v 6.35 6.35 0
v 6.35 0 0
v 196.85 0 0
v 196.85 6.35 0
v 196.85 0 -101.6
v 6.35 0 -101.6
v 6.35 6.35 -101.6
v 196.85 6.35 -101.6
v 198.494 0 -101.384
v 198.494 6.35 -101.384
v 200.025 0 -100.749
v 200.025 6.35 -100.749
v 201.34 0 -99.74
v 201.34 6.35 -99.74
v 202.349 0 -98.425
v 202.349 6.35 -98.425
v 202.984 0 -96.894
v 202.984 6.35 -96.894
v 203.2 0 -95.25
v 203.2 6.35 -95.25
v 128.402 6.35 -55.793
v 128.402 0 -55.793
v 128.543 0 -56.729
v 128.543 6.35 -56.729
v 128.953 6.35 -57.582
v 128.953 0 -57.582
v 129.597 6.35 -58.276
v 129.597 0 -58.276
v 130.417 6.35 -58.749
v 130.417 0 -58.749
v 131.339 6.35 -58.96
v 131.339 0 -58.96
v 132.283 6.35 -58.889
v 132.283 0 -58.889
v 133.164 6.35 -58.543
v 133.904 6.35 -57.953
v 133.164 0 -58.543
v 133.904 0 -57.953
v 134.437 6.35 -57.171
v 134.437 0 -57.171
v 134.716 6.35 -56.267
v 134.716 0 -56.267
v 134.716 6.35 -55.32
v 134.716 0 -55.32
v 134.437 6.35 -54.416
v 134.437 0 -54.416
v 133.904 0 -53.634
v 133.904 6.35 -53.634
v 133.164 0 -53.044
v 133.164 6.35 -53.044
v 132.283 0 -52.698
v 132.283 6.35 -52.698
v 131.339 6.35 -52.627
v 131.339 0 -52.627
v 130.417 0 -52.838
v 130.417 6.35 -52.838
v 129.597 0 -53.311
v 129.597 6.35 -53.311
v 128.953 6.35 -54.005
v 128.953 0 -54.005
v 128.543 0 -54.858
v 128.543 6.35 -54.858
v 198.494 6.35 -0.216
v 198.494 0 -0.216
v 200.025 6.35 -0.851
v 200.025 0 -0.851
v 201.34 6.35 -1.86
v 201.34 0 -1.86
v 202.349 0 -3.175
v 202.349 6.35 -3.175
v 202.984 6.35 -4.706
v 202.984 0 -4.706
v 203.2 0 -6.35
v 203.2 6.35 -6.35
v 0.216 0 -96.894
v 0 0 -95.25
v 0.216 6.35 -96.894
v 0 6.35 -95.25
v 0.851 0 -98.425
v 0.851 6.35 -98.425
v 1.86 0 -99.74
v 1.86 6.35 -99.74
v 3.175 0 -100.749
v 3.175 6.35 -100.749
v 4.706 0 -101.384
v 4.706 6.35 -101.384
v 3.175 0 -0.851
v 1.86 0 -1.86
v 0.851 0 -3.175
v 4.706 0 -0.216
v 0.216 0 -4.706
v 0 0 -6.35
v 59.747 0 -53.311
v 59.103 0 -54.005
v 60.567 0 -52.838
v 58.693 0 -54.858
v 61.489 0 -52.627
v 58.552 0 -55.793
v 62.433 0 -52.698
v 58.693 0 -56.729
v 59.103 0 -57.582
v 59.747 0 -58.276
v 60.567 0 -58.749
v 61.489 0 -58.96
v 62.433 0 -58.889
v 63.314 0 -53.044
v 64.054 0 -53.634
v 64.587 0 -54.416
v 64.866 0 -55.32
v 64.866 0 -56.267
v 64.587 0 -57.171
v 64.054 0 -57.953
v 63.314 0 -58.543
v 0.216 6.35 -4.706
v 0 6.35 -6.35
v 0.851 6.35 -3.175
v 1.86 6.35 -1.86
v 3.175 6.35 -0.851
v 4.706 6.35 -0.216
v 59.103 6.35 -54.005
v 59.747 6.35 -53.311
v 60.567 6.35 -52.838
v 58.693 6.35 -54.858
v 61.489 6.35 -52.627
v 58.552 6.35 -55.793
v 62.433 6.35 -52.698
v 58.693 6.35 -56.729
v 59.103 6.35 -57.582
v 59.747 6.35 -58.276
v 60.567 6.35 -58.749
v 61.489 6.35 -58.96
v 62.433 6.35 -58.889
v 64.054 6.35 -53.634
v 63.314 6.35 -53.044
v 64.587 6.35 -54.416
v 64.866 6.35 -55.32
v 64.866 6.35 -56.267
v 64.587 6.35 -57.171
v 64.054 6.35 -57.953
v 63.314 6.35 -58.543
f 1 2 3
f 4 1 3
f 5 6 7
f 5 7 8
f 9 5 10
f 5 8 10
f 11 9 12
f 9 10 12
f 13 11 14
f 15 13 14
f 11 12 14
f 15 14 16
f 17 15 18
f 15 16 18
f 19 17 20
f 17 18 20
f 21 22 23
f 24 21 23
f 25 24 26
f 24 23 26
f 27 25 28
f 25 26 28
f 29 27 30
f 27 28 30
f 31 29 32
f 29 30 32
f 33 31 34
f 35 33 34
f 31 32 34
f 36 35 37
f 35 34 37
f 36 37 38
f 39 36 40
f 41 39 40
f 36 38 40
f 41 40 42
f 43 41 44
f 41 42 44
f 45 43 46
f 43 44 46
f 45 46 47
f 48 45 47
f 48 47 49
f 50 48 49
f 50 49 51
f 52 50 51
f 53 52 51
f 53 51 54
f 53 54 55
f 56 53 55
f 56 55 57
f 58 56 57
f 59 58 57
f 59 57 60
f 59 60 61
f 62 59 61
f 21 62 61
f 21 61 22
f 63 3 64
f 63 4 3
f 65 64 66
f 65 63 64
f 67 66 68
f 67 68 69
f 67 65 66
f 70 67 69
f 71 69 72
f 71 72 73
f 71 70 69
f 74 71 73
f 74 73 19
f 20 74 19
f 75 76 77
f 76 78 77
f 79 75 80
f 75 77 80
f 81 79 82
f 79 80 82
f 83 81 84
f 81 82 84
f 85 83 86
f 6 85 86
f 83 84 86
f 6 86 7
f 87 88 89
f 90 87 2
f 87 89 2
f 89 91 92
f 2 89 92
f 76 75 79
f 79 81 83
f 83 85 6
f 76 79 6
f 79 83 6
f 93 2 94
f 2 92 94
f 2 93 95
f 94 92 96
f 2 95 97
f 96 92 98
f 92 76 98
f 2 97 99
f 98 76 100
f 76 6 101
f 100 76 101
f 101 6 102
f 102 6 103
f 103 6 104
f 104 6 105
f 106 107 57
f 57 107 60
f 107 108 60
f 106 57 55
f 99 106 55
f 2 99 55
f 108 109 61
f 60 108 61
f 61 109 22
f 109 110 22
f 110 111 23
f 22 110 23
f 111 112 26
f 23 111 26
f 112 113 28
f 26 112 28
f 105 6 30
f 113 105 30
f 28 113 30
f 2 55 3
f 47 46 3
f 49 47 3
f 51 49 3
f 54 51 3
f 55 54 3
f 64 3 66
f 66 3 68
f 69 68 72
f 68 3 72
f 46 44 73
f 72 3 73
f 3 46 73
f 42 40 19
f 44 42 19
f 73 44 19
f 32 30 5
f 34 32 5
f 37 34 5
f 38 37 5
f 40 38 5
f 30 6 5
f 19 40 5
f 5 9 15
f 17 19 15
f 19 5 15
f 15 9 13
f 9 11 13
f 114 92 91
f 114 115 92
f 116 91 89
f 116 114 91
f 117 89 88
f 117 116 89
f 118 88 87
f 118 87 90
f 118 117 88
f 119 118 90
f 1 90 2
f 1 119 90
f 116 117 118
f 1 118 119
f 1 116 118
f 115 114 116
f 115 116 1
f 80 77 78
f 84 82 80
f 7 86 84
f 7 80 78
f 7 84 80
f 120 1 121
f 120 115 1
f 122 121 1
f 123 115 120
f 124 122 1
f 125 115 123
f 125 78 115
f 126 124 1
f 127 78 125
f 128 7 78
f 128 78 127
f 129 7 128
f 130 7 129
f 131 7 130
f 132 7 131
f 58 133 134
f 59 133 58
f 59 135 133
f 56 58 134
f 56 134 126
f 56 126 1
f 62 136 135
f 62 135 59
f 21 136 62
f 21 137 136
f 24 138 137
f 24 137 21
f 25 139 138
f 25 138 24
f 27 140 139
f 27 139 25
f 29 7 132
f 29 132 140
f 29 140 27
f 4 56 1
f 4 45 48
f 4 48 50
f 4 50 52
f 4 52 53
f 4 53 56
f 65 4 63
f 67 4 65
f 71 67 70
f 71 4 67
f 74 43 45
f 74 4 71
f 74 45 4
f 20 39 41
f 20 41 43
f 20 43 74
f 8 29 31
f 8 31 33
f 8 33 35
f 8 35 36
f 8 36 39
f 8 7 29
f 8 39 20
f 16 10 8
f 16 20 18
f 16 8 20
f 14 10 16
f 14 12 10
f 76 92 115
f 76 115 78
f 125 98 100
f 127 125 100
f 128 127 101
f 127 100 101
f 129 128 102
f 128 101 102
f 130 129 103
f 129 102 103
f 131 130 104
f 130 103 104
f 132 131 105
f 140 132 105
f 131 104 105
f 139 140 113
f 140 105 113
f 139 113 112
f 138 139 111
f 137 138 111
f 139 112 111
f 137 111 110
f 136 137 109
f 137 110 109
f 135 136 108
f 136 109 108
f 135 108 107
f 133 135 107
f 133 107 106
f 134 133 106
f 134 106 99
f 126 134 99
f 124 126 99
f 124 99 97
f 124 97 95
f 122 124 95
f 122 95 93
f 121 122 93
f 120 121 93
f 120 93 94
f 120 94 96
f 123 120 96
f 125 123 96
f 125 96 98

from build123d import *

# Parameters (mm, degrees)
SKETCH1_W                   = 203.2
SKETCH1_H                   = 101.6
BOSS_EXTRUDE1_DEPTH         = 6.35
F_1_4_0_25_DIAMETER_HOLE1_D = 6.35
FILLET1_R                   = 6.35


with BuildPart() as part:
    # Sketch1 → Boss-Extrude1 (new body)
    with BuildSketch(Plane(origin=(0, 0, 0), x_dir=(1, 0, 0), z_dir=(0, 1, 0))):
        with Locations((101.6, 50.8)):
            Rectangle(SKETCH1_W, SKETCH1_H)
    extrude(amount=BOSS_EXTRUDE1_DEPTH)

    # 1/4 (0.25) Diameter Hole1 (through all)
    with Locations(Plane(origin=(0, 6.35, 0), x_dir=(1, 0, 0), z_dir=(0, 1, 0))):
        with Locations((61.726765383, 55.793470503), (131.576765383, 55.793470503)):
            Hole(F_1_4_0_25_DIAMETER_HOLE1_D / 2)

    # Fillet1
    fillet1_edges = [part.edges().sort_by_distance(p)[0] for p in [
        (0, 3.175, -101.6),
        (203.2, 3.175, -101.6),
        (203.2, 3.175, 0),
        (0, 3.175, 0),
    ]]
    fillet(fillet1_edges, radius=FILLET1_R)


solid = part.part
